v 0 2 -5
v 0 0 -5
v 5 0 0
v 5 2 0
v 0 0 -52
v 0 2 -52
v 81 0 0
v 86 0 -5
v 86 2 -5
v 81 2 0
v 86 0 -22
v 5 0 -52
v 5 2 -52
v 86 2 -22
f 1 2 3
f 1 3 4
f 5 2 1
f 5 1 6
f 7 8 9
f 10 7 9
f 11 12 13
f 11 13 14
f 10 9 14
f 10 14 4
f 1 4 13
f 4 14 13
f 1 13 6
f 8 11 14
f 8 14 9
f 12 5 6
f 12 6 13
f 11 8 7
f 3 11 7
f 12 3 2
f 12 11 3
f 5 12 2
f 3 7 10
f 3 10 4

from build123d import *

# Parameters (mm, degrees)
EXTRUDE_1_DEPTH = 2
CHAMFER_2_SIZE  = 5


with BuildPart() as part:
    # Эскиз1 → Бобышка-Вытянуть1 (new body)
    with BuildSketch(Plane(origin=(0, 0, 0), x_dir=(1, 0, 0), z_dir=(0, 1, 0))):
        Polygon((5, 52), (86, 22), (86, 0), (0, 0), (0, 52), align=None)
    extrude(amount=EXTRUDE_1_DEPTH)

    # Фаска2
    chamfer_2_edges = [part.edges().sort_by_distance(p)[0] for p in [
        (0, 1, 0),
        (86, 1, 0),
    ]]
    chamfer(chamfer_2_edges, length=CHAMFER_2_SIZE)


solid = part.part
